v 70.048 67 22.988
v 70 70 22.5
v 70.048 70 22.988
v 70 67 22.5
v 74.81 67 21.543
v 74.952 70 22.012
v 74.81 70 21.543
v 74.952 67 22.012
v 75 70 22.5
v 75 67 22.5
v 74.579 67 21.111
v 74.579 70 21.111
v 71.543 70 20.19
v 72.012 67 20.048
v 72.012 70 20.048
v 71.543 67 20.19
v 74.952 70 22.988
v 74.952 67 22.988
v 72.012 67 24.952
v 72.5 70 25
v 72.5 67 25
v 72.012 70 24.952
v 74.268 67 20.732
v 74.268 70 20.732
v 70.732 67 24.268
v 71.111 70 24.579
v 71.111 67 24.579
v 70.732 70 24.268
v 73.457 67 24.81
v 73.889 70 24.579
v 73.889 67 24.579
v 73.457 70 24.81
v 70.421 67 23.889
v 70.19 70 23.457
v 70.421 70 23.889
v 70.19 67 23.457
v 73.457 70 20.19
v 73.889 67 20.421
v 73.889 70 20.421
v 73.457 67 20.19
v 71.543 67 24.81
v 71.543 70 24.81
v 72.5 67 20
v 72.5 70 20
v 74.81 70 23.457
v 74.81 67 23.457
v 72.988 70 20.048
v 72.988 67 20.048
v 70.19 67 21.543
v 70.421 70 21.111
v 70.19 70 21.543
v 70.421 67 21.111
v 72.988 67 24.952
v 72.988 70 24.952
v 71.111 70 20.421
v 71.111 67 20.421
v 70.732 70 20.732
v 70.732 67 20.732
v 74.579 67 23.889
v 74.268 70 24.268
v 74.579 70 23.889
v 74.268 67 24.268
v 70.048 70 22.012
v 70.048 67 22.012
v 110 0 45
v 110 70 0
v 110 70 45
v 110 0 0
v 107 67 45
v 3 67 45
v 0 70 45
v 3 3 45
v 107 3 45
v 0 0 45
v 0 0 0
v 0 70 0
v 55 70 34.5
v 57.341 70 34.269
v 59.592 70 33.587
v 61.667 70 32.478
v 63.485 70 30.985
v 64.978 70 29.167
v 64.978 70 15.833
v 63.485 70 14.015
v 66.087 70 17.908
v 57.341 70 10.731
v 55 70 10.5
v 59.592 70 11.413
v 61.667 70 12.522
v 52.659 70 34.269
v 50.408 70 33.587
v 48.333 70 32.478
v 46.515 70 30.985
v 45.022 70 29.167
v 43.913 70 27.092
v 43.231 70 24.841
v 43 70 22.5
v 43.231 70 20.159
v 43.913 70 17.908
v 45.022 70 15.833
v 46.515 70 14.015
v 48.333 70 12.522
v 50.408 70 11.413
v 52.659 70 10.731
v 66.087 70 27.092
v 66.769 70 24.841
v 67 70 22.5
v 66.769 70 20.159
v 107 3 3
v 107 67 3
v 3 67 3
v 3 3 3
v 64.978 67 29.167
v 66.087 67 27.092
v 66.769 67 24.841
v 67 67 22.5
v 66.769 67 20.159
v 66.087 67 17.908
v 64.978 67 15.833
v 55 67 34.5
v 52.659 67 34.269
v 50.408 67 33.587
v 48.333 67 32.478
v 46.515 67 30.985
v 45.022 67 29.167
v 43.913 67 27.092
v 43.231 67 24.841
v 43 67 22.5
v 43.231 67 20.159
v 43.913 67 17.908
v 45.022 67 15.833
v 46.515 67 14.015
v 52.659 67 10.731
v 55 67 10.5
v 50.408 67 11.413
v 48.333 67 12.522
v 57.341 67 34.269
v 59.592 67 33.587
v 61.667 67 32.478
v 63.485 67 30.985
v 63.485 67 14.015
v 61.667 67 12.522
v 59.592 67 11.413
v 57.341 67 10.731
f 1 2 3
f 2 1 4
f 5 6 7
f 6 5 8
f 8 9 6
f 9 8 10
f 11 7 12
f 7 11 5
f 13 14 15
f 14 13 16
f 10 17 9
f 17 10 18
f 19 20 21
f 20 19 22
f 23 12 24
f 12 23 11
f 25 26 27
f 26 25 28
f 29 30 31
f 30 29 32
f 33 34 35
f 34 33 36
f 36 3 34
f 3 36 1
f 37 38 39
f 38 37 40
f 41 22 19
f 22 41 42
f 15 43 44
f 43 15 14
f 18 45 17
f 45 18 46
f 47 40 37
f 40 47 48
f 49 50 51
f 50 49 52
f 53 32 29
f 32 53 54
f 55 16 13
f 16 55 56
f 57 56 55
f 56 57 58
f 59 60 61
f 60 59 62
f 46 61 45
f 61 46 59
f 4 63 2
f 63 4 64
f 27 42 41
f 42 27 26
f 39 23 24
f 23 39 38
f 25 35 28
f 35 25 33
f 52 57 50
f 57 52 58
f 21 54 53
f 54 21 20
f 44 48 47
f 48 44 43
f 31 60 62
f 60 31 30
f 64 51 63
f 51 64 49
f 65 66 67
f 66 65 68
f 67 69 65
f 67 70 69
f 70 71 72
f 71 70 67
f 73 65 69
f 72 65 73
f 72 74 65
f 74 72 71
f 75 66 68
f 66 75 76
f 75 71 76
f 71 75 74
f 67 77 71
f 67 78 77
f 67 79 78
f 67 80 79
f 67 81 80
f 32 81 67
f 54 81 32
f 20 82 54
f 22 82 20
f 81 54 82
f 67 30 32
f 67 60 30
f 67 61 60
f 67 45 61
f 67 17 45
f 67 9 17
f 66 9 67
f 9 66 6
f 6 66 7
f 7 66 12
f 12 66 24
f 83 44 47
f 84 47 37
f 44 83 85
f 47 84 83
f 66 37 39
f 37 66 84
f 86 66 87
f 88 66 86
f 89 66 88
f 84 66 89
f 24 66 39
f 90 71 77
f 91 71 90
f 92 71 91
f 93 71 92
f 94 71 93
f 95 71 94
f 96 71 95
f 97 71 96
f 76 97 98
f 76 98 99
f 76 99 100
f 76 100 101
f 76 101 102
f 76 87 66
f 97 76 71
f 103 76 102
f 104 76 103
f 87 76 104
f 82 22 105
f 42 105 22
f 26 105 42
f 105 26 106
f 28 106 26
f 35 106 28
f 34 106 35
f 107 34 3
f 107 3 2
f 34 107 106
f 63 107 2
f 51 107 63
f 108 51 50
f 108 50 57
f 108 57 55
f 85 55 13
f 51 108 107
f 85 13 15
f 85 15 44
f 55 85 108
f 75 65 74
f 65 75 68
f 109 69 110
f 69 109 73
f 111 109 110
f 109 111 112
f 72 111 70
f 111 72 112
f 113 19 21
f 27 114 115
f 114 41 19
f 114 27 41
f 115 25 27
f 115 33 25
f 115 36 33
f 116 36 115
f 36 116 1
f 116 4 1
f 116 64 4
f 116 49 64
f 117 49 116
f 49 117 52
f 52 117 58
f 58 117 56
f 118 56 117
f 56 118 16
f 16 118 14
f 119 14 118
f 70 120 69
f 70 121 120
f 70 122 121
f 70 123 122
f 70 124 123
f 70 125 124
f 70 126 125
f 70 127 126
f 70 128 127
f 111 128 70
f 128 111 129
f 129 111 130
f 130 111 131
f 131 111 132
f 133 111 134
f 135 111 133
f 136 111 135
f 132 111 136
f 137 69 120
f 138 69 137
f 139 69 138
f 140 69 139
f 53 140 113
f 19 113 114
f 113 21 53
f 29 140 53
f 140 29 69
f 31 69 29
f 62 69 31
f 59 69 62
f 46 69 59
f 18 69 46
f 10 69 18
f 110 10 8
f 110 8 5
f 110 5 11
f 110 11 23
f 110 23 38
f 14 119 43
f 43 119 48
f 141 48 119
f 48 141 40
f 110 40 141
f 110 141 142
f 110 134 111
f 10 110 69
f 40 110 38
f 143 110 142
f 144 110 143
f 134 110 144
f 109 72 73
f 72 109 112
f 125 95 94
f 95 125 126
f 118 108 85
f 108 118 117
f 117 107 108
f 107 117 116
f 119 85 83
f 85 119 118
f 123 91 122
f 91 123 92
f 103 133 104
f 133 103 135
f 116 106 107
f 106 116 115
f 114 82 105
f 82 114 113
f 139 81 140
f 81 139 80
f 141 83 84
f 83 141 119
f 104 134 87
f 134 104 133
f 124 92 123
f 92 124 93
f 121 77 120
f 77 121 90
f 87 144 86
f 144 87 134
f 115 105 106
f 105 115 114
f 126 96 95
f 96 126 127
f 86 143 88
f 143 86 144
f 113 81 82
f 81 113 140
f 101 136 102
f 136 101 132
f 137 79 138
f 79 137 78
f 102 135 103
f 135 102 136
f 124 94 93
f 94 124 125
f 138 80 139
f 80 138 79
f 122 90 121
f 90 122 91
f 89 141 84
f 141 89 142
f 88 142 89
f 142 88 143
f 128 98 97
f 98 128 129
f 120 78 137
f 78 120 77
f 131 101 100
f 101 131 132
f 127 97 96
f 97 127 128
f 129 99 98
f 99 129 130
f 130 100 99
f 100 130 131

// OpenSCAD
$fn = 32;

// ----------------------------------------------------------------------
// Vent box: roundvent enclosure
// ----------------------------------------------------------------------

// --- parameters (mm) ---
box_l = 110;              // box length, X
box_w = 70;               // box width, Y
box_h = 45;               // box height, Z
wall_t = 3;               // shell wall thickness
vent_d = 24;              // central vent diameter
ring_d = 5;               // ring hole diameter
n_ring = 6;               // holes in the ring
ring_r = 17.5;            // ring radius

ring_step = 360 / n_ring;  // ring hole angular step

difference() {
  cube([box_l, box_w, box_h]);
  translate([wall_t, wall_t, wall_t])
    cube([box_l - 2 * wall_t, box_w - 2 * wall_t, box_h]);
  translate([box_l / 2, box_w - wall_t - 1, box_h / 2])
    rotate([-90, 0, 0]) cylinder(h = wall_t + 2, d = vent_d);
  for (i = [0 : n_ring - 1])
    translate([box_l / 2, box_w - wall_t - 1, box_h / 2])
      rotate([0, 0, i * ring_step])
        translate([ring_r, 0, 0]) rotate([-90, 0, 0])
          cylinder(h = wall_t + 2, d = ring_d);
}
